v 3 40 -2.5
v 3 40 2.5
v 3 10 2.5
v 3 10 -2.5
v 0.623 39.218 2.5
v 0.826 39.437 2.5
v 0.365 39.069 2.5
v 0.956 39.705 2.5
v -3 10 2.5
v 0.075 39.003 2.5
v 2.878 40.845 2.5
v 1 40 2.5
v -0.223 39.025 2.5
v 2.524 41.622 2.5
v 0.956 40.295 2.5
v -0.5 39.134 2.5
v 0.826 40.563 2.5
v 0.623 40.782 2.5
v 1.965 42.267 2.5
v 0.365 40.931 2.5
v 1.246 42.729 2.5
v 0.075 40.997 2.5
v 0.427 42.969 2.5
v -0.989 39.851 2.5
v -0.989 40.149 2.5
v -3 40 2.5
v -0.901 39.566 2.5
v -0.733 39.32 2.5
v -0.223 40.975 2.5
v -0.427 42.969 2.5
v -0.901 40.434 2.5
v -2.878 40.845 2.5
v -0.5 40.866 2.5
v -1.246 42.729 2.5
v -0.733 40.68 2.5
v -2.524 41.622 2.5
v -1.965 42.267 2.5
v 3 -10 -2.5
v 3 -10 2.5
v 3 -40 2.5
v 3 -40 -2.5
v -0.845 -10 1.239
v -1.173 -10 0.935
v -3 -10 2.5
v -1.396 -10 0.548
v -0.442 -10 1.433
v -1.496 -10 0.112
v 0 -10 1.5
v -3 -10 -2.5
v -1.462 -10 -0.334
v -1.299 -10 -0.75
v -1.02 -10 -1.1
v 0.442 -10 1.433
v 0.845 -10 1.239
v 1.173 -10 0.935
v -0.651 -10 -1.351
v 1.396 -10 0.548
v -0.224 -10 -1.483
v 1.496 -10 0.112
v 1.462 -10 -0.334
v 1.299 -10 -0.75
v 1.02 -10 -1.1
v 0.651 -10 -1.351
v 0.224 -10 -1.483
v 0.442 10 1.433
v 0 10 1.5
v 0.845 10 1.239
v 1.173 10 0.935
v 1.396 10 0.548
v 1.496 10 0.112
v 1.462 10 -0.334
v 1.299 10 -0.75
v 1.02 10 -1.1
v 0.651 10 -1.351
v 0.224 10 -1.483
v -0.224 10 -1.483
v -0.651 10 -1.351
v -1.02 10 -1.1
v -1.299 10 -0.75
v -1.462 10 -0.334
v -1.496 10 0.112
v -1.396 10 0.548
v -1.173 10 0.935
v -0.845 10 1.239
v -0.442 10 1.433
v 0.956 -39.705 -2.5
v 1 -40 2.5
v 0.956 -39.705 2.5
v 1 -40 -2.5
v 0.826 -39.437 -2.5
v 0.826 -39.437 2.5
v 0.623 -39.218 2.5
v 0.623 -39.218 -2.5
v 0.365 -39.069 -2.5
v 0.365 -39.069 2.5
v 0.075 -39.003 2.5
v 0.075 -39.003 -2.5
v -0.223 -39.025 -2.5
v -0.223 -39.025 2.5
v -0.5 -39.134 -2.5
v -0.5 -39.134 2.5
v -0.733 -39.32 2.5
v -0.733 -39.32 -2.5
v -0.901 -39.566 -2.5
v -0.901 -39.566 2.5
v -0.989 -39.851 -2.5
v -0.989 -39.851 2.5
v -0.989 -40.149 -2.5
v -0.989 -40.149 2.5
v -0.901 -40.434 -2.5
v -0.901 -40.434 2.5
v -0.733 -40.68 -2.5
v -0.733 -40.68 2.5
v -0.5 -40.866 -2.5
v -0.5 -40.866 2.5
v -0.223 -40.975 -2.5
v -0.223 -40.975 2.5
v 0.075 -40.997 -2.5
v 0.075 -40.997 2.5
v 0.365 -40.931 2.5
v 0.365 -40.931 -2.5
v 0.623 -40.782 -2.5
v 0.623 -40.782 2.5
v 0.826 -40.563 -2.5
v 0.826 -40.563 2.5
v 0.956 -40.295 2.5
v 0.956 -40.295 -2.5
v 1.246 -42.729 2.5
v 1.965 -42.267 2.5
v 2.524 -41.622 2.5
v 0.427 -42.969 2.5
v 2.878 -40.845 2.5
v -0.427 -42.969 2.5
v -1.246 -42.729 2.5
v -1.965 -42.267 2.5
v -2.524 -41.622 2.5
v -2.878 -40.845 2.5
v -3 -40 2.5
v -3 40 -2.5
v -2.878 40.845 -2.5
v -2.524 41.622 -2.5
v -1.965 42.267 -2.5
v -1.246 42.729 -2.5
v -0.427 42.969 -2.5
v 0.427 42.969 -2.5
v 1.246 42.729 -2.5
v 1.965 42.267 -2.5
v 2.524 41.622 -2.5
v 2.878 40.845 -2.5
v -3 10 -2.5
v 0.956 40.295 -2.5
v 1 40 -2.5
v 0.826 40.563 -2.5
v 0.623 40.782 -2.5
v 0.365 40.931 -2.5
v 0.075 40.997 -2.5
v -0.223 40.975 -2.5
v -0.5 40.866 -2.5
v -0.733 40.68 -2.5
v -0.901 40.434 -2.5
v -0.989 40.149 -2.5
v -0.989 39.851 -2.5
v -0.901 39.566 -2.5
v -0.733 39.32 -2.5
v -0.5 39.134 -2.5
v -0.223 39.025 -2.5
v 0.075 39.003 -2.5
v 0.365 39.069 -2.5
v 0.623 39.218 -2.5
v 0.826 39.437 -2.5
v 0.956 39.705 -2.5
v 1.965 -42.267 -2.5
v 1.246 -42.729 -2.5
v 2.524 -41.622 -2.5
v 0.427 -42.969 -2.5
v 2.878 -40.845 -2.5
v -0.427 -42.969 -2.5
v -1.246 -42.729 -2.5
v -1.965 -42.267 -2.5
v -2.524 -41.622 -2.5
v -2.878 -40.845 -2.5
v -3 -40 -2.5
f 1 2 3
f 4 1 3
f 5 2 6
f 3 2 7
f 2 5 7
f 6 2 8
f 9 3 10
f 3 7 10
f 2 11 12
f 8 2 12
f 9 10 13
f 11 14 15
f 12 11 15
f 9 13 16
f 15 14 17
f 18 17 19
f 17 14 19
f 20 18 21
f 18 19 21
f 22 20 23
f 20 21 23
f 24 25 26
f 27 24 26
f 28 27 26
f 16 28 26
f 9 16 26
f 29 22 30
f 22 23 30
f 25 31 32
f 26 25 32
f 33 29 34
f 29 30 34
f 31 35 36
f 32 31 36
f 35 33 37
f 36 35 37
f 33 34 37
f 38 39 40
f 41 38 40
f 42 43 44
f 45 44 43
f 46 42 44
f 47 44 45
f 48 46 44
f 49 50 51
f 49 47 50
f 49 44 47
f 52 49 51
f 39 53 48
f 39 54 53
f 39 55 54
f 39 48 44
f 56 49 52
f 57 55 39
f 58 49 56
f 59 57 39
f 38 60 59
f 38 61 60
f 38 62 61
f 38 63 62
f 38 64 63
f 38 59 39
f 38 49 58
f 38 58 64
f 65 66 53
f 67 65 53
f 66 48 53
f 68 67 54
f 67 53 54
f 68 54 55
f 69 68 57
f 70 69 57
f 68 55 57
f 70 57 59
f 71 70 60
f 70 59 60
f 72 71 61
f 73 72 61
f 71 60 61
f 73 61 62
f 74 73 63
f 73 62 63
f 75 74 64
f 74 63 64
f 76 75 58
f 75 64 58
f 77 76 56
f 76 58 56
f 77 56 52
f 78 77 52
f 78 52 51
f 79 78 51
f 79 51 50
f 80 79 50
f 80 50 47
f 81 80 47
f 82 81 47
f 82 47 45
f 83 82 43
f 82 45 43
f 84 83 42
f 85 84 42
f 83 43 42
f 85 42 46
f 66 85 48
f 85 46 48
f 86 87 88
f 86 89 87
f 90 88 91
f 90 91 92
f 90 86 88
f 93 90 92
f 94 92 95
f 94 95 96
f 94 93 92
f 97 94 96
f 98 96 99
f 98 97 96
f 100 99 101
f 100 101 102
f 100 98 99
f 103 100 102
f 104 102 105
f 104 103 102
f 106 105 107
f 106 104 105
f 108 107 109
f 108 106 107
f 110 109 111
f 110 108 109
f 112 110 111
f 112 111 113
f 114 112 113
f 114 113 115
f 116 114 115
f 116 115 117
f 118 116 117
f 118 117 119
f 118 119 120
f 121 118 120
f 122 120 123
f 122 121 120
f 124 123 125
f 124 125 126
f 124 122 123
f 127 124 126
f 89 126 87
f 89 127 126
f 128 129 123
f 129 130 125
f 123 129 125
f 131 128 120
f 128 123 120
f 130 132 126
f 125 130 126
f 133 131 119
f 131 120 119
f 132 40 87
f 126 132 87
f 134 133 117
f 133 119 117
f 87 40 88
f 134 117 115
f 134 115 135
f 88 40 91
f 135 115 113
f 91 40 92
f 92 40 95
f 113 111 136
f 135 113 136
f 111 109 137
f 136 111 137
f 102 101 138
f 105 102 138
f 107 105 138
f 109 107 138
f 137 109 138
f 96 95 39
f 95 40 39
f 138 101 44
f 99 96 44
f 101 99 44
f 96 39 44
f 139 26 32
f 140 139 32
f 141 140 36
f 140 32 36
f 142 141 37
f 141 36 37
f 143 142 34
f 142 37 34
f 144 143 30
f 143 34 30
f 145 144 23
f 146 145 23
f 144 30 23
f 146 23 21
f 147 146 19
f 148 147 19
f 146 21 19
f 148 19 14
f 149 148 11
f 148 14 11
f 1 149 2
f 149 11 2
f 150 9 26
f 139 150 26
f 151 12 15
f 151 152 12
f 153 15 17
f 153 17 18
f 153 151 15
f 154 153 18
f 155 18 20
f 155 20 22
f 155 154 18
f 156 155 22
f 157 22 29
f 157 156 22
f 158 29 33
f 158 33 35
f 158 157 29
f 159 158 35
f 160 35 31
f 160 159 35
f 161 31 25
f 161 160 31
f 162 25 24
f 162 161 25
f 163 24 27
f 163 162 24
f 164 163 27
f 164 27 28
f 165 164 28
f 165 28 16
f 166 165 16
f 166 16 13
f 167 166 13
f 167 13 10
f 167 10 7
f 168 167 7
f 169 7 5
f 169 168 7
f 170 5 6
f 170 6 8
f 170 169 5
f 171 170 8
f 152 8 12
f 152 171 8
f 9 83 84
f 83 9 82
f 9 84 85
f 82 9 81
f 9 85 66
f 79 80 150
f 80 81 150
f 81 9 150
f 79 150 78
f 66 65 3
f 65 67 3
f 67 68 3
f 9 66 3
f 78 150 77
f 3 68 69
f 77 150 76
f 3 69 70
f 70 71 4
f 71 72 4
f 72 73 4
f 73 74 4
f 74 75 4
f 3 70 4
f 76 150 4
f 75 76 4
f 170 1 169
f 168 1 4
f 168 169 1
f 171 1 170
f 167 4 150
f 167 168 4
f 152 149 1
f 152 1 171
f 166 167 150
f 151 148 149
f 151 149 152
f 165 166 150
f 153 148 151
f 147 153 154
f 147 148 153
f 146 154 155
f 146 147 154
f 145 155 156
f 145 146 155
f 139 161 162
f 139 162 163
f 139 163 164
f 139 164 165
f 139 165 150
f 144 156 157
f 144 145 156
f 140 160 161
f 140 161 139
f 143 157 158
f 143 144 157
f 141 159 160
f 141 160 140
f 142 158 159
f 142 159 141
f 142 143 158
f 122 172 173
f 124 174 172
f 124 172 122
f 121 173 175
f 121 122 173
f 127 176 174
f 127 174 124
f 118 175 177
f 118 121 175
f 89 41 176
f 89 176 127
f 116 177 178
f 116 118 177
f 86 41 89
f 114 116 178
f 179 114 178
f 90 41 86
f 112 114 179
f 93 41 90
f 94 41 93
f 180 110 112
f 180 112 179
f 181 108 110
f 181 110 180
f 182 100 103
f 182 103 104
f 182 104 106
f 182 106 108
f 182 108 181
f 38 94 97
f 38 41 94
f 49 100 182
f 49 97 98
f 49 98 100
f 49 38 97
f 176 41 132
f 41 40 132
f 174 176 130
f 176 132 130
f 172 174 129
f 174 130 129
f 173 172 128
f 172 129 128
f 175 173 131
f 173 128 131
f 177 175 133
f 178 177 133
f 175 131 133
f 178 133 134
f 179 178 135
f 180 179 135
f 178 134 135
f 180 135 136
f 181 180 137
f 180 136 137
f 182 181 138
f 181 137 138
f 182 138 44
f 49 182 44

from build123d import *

# Parameters (mm, degrees)
SKETCH_1_R          = 1
EXTRUDE_1_DEPTH     = 2.5
SKETCH_4_R          = 5.341815289
SKETCH_4_R_2        = 1.5
CUT_EXTRUDE_2_DEPTH = 10


with BuildPart() as part:
    # 草图1 → 凸台-拉伸1 (new, symmetric)
    with BuildSketch(Plane.XY):
        with BuildLine():
            Line((3, 0), (3, -80))
            ThreePointArc((3, -80), (0, -83), (-3, -80))
            Line((-3, -80), (-3, 0))
            ThreePointArc((-3, 0), (0, 3), (3, 0))
        make_face()
        Circle(SKETCH_1_R, mode=Mode.SUBTRACT)
        with Locations((0, -80)):
            Circle(SKETCH_1_R, mode=Mode.SUBTRACT)
    extrude(amount=EXTRUDE_1_DEPTH, both=True)


with BuildPart() as part_1:
    # Move Body 1: moved
    add(part.part.moved(Location((0, 40, 0))))

    # 草图4 → 切除-拉伸2 (cut, symmetric)
    with BuildSketch(Plane(origin=(0, 0, 0), x_dir=(1, 0, 0), z_dir=(0, 1, 0))):
        Circle(SKETCH_4_R)
        with Locations(Location((0, 0, 0), (0, 0, 270))):
            Circle(SKETCH_4_R_2, mode=Mode.SUBTRACT)
    extrude(amount=CUT_EXTRUDE_2_DEPTH, both=True, mode=Mode.SUBTRACT)


solid = part_1.part
